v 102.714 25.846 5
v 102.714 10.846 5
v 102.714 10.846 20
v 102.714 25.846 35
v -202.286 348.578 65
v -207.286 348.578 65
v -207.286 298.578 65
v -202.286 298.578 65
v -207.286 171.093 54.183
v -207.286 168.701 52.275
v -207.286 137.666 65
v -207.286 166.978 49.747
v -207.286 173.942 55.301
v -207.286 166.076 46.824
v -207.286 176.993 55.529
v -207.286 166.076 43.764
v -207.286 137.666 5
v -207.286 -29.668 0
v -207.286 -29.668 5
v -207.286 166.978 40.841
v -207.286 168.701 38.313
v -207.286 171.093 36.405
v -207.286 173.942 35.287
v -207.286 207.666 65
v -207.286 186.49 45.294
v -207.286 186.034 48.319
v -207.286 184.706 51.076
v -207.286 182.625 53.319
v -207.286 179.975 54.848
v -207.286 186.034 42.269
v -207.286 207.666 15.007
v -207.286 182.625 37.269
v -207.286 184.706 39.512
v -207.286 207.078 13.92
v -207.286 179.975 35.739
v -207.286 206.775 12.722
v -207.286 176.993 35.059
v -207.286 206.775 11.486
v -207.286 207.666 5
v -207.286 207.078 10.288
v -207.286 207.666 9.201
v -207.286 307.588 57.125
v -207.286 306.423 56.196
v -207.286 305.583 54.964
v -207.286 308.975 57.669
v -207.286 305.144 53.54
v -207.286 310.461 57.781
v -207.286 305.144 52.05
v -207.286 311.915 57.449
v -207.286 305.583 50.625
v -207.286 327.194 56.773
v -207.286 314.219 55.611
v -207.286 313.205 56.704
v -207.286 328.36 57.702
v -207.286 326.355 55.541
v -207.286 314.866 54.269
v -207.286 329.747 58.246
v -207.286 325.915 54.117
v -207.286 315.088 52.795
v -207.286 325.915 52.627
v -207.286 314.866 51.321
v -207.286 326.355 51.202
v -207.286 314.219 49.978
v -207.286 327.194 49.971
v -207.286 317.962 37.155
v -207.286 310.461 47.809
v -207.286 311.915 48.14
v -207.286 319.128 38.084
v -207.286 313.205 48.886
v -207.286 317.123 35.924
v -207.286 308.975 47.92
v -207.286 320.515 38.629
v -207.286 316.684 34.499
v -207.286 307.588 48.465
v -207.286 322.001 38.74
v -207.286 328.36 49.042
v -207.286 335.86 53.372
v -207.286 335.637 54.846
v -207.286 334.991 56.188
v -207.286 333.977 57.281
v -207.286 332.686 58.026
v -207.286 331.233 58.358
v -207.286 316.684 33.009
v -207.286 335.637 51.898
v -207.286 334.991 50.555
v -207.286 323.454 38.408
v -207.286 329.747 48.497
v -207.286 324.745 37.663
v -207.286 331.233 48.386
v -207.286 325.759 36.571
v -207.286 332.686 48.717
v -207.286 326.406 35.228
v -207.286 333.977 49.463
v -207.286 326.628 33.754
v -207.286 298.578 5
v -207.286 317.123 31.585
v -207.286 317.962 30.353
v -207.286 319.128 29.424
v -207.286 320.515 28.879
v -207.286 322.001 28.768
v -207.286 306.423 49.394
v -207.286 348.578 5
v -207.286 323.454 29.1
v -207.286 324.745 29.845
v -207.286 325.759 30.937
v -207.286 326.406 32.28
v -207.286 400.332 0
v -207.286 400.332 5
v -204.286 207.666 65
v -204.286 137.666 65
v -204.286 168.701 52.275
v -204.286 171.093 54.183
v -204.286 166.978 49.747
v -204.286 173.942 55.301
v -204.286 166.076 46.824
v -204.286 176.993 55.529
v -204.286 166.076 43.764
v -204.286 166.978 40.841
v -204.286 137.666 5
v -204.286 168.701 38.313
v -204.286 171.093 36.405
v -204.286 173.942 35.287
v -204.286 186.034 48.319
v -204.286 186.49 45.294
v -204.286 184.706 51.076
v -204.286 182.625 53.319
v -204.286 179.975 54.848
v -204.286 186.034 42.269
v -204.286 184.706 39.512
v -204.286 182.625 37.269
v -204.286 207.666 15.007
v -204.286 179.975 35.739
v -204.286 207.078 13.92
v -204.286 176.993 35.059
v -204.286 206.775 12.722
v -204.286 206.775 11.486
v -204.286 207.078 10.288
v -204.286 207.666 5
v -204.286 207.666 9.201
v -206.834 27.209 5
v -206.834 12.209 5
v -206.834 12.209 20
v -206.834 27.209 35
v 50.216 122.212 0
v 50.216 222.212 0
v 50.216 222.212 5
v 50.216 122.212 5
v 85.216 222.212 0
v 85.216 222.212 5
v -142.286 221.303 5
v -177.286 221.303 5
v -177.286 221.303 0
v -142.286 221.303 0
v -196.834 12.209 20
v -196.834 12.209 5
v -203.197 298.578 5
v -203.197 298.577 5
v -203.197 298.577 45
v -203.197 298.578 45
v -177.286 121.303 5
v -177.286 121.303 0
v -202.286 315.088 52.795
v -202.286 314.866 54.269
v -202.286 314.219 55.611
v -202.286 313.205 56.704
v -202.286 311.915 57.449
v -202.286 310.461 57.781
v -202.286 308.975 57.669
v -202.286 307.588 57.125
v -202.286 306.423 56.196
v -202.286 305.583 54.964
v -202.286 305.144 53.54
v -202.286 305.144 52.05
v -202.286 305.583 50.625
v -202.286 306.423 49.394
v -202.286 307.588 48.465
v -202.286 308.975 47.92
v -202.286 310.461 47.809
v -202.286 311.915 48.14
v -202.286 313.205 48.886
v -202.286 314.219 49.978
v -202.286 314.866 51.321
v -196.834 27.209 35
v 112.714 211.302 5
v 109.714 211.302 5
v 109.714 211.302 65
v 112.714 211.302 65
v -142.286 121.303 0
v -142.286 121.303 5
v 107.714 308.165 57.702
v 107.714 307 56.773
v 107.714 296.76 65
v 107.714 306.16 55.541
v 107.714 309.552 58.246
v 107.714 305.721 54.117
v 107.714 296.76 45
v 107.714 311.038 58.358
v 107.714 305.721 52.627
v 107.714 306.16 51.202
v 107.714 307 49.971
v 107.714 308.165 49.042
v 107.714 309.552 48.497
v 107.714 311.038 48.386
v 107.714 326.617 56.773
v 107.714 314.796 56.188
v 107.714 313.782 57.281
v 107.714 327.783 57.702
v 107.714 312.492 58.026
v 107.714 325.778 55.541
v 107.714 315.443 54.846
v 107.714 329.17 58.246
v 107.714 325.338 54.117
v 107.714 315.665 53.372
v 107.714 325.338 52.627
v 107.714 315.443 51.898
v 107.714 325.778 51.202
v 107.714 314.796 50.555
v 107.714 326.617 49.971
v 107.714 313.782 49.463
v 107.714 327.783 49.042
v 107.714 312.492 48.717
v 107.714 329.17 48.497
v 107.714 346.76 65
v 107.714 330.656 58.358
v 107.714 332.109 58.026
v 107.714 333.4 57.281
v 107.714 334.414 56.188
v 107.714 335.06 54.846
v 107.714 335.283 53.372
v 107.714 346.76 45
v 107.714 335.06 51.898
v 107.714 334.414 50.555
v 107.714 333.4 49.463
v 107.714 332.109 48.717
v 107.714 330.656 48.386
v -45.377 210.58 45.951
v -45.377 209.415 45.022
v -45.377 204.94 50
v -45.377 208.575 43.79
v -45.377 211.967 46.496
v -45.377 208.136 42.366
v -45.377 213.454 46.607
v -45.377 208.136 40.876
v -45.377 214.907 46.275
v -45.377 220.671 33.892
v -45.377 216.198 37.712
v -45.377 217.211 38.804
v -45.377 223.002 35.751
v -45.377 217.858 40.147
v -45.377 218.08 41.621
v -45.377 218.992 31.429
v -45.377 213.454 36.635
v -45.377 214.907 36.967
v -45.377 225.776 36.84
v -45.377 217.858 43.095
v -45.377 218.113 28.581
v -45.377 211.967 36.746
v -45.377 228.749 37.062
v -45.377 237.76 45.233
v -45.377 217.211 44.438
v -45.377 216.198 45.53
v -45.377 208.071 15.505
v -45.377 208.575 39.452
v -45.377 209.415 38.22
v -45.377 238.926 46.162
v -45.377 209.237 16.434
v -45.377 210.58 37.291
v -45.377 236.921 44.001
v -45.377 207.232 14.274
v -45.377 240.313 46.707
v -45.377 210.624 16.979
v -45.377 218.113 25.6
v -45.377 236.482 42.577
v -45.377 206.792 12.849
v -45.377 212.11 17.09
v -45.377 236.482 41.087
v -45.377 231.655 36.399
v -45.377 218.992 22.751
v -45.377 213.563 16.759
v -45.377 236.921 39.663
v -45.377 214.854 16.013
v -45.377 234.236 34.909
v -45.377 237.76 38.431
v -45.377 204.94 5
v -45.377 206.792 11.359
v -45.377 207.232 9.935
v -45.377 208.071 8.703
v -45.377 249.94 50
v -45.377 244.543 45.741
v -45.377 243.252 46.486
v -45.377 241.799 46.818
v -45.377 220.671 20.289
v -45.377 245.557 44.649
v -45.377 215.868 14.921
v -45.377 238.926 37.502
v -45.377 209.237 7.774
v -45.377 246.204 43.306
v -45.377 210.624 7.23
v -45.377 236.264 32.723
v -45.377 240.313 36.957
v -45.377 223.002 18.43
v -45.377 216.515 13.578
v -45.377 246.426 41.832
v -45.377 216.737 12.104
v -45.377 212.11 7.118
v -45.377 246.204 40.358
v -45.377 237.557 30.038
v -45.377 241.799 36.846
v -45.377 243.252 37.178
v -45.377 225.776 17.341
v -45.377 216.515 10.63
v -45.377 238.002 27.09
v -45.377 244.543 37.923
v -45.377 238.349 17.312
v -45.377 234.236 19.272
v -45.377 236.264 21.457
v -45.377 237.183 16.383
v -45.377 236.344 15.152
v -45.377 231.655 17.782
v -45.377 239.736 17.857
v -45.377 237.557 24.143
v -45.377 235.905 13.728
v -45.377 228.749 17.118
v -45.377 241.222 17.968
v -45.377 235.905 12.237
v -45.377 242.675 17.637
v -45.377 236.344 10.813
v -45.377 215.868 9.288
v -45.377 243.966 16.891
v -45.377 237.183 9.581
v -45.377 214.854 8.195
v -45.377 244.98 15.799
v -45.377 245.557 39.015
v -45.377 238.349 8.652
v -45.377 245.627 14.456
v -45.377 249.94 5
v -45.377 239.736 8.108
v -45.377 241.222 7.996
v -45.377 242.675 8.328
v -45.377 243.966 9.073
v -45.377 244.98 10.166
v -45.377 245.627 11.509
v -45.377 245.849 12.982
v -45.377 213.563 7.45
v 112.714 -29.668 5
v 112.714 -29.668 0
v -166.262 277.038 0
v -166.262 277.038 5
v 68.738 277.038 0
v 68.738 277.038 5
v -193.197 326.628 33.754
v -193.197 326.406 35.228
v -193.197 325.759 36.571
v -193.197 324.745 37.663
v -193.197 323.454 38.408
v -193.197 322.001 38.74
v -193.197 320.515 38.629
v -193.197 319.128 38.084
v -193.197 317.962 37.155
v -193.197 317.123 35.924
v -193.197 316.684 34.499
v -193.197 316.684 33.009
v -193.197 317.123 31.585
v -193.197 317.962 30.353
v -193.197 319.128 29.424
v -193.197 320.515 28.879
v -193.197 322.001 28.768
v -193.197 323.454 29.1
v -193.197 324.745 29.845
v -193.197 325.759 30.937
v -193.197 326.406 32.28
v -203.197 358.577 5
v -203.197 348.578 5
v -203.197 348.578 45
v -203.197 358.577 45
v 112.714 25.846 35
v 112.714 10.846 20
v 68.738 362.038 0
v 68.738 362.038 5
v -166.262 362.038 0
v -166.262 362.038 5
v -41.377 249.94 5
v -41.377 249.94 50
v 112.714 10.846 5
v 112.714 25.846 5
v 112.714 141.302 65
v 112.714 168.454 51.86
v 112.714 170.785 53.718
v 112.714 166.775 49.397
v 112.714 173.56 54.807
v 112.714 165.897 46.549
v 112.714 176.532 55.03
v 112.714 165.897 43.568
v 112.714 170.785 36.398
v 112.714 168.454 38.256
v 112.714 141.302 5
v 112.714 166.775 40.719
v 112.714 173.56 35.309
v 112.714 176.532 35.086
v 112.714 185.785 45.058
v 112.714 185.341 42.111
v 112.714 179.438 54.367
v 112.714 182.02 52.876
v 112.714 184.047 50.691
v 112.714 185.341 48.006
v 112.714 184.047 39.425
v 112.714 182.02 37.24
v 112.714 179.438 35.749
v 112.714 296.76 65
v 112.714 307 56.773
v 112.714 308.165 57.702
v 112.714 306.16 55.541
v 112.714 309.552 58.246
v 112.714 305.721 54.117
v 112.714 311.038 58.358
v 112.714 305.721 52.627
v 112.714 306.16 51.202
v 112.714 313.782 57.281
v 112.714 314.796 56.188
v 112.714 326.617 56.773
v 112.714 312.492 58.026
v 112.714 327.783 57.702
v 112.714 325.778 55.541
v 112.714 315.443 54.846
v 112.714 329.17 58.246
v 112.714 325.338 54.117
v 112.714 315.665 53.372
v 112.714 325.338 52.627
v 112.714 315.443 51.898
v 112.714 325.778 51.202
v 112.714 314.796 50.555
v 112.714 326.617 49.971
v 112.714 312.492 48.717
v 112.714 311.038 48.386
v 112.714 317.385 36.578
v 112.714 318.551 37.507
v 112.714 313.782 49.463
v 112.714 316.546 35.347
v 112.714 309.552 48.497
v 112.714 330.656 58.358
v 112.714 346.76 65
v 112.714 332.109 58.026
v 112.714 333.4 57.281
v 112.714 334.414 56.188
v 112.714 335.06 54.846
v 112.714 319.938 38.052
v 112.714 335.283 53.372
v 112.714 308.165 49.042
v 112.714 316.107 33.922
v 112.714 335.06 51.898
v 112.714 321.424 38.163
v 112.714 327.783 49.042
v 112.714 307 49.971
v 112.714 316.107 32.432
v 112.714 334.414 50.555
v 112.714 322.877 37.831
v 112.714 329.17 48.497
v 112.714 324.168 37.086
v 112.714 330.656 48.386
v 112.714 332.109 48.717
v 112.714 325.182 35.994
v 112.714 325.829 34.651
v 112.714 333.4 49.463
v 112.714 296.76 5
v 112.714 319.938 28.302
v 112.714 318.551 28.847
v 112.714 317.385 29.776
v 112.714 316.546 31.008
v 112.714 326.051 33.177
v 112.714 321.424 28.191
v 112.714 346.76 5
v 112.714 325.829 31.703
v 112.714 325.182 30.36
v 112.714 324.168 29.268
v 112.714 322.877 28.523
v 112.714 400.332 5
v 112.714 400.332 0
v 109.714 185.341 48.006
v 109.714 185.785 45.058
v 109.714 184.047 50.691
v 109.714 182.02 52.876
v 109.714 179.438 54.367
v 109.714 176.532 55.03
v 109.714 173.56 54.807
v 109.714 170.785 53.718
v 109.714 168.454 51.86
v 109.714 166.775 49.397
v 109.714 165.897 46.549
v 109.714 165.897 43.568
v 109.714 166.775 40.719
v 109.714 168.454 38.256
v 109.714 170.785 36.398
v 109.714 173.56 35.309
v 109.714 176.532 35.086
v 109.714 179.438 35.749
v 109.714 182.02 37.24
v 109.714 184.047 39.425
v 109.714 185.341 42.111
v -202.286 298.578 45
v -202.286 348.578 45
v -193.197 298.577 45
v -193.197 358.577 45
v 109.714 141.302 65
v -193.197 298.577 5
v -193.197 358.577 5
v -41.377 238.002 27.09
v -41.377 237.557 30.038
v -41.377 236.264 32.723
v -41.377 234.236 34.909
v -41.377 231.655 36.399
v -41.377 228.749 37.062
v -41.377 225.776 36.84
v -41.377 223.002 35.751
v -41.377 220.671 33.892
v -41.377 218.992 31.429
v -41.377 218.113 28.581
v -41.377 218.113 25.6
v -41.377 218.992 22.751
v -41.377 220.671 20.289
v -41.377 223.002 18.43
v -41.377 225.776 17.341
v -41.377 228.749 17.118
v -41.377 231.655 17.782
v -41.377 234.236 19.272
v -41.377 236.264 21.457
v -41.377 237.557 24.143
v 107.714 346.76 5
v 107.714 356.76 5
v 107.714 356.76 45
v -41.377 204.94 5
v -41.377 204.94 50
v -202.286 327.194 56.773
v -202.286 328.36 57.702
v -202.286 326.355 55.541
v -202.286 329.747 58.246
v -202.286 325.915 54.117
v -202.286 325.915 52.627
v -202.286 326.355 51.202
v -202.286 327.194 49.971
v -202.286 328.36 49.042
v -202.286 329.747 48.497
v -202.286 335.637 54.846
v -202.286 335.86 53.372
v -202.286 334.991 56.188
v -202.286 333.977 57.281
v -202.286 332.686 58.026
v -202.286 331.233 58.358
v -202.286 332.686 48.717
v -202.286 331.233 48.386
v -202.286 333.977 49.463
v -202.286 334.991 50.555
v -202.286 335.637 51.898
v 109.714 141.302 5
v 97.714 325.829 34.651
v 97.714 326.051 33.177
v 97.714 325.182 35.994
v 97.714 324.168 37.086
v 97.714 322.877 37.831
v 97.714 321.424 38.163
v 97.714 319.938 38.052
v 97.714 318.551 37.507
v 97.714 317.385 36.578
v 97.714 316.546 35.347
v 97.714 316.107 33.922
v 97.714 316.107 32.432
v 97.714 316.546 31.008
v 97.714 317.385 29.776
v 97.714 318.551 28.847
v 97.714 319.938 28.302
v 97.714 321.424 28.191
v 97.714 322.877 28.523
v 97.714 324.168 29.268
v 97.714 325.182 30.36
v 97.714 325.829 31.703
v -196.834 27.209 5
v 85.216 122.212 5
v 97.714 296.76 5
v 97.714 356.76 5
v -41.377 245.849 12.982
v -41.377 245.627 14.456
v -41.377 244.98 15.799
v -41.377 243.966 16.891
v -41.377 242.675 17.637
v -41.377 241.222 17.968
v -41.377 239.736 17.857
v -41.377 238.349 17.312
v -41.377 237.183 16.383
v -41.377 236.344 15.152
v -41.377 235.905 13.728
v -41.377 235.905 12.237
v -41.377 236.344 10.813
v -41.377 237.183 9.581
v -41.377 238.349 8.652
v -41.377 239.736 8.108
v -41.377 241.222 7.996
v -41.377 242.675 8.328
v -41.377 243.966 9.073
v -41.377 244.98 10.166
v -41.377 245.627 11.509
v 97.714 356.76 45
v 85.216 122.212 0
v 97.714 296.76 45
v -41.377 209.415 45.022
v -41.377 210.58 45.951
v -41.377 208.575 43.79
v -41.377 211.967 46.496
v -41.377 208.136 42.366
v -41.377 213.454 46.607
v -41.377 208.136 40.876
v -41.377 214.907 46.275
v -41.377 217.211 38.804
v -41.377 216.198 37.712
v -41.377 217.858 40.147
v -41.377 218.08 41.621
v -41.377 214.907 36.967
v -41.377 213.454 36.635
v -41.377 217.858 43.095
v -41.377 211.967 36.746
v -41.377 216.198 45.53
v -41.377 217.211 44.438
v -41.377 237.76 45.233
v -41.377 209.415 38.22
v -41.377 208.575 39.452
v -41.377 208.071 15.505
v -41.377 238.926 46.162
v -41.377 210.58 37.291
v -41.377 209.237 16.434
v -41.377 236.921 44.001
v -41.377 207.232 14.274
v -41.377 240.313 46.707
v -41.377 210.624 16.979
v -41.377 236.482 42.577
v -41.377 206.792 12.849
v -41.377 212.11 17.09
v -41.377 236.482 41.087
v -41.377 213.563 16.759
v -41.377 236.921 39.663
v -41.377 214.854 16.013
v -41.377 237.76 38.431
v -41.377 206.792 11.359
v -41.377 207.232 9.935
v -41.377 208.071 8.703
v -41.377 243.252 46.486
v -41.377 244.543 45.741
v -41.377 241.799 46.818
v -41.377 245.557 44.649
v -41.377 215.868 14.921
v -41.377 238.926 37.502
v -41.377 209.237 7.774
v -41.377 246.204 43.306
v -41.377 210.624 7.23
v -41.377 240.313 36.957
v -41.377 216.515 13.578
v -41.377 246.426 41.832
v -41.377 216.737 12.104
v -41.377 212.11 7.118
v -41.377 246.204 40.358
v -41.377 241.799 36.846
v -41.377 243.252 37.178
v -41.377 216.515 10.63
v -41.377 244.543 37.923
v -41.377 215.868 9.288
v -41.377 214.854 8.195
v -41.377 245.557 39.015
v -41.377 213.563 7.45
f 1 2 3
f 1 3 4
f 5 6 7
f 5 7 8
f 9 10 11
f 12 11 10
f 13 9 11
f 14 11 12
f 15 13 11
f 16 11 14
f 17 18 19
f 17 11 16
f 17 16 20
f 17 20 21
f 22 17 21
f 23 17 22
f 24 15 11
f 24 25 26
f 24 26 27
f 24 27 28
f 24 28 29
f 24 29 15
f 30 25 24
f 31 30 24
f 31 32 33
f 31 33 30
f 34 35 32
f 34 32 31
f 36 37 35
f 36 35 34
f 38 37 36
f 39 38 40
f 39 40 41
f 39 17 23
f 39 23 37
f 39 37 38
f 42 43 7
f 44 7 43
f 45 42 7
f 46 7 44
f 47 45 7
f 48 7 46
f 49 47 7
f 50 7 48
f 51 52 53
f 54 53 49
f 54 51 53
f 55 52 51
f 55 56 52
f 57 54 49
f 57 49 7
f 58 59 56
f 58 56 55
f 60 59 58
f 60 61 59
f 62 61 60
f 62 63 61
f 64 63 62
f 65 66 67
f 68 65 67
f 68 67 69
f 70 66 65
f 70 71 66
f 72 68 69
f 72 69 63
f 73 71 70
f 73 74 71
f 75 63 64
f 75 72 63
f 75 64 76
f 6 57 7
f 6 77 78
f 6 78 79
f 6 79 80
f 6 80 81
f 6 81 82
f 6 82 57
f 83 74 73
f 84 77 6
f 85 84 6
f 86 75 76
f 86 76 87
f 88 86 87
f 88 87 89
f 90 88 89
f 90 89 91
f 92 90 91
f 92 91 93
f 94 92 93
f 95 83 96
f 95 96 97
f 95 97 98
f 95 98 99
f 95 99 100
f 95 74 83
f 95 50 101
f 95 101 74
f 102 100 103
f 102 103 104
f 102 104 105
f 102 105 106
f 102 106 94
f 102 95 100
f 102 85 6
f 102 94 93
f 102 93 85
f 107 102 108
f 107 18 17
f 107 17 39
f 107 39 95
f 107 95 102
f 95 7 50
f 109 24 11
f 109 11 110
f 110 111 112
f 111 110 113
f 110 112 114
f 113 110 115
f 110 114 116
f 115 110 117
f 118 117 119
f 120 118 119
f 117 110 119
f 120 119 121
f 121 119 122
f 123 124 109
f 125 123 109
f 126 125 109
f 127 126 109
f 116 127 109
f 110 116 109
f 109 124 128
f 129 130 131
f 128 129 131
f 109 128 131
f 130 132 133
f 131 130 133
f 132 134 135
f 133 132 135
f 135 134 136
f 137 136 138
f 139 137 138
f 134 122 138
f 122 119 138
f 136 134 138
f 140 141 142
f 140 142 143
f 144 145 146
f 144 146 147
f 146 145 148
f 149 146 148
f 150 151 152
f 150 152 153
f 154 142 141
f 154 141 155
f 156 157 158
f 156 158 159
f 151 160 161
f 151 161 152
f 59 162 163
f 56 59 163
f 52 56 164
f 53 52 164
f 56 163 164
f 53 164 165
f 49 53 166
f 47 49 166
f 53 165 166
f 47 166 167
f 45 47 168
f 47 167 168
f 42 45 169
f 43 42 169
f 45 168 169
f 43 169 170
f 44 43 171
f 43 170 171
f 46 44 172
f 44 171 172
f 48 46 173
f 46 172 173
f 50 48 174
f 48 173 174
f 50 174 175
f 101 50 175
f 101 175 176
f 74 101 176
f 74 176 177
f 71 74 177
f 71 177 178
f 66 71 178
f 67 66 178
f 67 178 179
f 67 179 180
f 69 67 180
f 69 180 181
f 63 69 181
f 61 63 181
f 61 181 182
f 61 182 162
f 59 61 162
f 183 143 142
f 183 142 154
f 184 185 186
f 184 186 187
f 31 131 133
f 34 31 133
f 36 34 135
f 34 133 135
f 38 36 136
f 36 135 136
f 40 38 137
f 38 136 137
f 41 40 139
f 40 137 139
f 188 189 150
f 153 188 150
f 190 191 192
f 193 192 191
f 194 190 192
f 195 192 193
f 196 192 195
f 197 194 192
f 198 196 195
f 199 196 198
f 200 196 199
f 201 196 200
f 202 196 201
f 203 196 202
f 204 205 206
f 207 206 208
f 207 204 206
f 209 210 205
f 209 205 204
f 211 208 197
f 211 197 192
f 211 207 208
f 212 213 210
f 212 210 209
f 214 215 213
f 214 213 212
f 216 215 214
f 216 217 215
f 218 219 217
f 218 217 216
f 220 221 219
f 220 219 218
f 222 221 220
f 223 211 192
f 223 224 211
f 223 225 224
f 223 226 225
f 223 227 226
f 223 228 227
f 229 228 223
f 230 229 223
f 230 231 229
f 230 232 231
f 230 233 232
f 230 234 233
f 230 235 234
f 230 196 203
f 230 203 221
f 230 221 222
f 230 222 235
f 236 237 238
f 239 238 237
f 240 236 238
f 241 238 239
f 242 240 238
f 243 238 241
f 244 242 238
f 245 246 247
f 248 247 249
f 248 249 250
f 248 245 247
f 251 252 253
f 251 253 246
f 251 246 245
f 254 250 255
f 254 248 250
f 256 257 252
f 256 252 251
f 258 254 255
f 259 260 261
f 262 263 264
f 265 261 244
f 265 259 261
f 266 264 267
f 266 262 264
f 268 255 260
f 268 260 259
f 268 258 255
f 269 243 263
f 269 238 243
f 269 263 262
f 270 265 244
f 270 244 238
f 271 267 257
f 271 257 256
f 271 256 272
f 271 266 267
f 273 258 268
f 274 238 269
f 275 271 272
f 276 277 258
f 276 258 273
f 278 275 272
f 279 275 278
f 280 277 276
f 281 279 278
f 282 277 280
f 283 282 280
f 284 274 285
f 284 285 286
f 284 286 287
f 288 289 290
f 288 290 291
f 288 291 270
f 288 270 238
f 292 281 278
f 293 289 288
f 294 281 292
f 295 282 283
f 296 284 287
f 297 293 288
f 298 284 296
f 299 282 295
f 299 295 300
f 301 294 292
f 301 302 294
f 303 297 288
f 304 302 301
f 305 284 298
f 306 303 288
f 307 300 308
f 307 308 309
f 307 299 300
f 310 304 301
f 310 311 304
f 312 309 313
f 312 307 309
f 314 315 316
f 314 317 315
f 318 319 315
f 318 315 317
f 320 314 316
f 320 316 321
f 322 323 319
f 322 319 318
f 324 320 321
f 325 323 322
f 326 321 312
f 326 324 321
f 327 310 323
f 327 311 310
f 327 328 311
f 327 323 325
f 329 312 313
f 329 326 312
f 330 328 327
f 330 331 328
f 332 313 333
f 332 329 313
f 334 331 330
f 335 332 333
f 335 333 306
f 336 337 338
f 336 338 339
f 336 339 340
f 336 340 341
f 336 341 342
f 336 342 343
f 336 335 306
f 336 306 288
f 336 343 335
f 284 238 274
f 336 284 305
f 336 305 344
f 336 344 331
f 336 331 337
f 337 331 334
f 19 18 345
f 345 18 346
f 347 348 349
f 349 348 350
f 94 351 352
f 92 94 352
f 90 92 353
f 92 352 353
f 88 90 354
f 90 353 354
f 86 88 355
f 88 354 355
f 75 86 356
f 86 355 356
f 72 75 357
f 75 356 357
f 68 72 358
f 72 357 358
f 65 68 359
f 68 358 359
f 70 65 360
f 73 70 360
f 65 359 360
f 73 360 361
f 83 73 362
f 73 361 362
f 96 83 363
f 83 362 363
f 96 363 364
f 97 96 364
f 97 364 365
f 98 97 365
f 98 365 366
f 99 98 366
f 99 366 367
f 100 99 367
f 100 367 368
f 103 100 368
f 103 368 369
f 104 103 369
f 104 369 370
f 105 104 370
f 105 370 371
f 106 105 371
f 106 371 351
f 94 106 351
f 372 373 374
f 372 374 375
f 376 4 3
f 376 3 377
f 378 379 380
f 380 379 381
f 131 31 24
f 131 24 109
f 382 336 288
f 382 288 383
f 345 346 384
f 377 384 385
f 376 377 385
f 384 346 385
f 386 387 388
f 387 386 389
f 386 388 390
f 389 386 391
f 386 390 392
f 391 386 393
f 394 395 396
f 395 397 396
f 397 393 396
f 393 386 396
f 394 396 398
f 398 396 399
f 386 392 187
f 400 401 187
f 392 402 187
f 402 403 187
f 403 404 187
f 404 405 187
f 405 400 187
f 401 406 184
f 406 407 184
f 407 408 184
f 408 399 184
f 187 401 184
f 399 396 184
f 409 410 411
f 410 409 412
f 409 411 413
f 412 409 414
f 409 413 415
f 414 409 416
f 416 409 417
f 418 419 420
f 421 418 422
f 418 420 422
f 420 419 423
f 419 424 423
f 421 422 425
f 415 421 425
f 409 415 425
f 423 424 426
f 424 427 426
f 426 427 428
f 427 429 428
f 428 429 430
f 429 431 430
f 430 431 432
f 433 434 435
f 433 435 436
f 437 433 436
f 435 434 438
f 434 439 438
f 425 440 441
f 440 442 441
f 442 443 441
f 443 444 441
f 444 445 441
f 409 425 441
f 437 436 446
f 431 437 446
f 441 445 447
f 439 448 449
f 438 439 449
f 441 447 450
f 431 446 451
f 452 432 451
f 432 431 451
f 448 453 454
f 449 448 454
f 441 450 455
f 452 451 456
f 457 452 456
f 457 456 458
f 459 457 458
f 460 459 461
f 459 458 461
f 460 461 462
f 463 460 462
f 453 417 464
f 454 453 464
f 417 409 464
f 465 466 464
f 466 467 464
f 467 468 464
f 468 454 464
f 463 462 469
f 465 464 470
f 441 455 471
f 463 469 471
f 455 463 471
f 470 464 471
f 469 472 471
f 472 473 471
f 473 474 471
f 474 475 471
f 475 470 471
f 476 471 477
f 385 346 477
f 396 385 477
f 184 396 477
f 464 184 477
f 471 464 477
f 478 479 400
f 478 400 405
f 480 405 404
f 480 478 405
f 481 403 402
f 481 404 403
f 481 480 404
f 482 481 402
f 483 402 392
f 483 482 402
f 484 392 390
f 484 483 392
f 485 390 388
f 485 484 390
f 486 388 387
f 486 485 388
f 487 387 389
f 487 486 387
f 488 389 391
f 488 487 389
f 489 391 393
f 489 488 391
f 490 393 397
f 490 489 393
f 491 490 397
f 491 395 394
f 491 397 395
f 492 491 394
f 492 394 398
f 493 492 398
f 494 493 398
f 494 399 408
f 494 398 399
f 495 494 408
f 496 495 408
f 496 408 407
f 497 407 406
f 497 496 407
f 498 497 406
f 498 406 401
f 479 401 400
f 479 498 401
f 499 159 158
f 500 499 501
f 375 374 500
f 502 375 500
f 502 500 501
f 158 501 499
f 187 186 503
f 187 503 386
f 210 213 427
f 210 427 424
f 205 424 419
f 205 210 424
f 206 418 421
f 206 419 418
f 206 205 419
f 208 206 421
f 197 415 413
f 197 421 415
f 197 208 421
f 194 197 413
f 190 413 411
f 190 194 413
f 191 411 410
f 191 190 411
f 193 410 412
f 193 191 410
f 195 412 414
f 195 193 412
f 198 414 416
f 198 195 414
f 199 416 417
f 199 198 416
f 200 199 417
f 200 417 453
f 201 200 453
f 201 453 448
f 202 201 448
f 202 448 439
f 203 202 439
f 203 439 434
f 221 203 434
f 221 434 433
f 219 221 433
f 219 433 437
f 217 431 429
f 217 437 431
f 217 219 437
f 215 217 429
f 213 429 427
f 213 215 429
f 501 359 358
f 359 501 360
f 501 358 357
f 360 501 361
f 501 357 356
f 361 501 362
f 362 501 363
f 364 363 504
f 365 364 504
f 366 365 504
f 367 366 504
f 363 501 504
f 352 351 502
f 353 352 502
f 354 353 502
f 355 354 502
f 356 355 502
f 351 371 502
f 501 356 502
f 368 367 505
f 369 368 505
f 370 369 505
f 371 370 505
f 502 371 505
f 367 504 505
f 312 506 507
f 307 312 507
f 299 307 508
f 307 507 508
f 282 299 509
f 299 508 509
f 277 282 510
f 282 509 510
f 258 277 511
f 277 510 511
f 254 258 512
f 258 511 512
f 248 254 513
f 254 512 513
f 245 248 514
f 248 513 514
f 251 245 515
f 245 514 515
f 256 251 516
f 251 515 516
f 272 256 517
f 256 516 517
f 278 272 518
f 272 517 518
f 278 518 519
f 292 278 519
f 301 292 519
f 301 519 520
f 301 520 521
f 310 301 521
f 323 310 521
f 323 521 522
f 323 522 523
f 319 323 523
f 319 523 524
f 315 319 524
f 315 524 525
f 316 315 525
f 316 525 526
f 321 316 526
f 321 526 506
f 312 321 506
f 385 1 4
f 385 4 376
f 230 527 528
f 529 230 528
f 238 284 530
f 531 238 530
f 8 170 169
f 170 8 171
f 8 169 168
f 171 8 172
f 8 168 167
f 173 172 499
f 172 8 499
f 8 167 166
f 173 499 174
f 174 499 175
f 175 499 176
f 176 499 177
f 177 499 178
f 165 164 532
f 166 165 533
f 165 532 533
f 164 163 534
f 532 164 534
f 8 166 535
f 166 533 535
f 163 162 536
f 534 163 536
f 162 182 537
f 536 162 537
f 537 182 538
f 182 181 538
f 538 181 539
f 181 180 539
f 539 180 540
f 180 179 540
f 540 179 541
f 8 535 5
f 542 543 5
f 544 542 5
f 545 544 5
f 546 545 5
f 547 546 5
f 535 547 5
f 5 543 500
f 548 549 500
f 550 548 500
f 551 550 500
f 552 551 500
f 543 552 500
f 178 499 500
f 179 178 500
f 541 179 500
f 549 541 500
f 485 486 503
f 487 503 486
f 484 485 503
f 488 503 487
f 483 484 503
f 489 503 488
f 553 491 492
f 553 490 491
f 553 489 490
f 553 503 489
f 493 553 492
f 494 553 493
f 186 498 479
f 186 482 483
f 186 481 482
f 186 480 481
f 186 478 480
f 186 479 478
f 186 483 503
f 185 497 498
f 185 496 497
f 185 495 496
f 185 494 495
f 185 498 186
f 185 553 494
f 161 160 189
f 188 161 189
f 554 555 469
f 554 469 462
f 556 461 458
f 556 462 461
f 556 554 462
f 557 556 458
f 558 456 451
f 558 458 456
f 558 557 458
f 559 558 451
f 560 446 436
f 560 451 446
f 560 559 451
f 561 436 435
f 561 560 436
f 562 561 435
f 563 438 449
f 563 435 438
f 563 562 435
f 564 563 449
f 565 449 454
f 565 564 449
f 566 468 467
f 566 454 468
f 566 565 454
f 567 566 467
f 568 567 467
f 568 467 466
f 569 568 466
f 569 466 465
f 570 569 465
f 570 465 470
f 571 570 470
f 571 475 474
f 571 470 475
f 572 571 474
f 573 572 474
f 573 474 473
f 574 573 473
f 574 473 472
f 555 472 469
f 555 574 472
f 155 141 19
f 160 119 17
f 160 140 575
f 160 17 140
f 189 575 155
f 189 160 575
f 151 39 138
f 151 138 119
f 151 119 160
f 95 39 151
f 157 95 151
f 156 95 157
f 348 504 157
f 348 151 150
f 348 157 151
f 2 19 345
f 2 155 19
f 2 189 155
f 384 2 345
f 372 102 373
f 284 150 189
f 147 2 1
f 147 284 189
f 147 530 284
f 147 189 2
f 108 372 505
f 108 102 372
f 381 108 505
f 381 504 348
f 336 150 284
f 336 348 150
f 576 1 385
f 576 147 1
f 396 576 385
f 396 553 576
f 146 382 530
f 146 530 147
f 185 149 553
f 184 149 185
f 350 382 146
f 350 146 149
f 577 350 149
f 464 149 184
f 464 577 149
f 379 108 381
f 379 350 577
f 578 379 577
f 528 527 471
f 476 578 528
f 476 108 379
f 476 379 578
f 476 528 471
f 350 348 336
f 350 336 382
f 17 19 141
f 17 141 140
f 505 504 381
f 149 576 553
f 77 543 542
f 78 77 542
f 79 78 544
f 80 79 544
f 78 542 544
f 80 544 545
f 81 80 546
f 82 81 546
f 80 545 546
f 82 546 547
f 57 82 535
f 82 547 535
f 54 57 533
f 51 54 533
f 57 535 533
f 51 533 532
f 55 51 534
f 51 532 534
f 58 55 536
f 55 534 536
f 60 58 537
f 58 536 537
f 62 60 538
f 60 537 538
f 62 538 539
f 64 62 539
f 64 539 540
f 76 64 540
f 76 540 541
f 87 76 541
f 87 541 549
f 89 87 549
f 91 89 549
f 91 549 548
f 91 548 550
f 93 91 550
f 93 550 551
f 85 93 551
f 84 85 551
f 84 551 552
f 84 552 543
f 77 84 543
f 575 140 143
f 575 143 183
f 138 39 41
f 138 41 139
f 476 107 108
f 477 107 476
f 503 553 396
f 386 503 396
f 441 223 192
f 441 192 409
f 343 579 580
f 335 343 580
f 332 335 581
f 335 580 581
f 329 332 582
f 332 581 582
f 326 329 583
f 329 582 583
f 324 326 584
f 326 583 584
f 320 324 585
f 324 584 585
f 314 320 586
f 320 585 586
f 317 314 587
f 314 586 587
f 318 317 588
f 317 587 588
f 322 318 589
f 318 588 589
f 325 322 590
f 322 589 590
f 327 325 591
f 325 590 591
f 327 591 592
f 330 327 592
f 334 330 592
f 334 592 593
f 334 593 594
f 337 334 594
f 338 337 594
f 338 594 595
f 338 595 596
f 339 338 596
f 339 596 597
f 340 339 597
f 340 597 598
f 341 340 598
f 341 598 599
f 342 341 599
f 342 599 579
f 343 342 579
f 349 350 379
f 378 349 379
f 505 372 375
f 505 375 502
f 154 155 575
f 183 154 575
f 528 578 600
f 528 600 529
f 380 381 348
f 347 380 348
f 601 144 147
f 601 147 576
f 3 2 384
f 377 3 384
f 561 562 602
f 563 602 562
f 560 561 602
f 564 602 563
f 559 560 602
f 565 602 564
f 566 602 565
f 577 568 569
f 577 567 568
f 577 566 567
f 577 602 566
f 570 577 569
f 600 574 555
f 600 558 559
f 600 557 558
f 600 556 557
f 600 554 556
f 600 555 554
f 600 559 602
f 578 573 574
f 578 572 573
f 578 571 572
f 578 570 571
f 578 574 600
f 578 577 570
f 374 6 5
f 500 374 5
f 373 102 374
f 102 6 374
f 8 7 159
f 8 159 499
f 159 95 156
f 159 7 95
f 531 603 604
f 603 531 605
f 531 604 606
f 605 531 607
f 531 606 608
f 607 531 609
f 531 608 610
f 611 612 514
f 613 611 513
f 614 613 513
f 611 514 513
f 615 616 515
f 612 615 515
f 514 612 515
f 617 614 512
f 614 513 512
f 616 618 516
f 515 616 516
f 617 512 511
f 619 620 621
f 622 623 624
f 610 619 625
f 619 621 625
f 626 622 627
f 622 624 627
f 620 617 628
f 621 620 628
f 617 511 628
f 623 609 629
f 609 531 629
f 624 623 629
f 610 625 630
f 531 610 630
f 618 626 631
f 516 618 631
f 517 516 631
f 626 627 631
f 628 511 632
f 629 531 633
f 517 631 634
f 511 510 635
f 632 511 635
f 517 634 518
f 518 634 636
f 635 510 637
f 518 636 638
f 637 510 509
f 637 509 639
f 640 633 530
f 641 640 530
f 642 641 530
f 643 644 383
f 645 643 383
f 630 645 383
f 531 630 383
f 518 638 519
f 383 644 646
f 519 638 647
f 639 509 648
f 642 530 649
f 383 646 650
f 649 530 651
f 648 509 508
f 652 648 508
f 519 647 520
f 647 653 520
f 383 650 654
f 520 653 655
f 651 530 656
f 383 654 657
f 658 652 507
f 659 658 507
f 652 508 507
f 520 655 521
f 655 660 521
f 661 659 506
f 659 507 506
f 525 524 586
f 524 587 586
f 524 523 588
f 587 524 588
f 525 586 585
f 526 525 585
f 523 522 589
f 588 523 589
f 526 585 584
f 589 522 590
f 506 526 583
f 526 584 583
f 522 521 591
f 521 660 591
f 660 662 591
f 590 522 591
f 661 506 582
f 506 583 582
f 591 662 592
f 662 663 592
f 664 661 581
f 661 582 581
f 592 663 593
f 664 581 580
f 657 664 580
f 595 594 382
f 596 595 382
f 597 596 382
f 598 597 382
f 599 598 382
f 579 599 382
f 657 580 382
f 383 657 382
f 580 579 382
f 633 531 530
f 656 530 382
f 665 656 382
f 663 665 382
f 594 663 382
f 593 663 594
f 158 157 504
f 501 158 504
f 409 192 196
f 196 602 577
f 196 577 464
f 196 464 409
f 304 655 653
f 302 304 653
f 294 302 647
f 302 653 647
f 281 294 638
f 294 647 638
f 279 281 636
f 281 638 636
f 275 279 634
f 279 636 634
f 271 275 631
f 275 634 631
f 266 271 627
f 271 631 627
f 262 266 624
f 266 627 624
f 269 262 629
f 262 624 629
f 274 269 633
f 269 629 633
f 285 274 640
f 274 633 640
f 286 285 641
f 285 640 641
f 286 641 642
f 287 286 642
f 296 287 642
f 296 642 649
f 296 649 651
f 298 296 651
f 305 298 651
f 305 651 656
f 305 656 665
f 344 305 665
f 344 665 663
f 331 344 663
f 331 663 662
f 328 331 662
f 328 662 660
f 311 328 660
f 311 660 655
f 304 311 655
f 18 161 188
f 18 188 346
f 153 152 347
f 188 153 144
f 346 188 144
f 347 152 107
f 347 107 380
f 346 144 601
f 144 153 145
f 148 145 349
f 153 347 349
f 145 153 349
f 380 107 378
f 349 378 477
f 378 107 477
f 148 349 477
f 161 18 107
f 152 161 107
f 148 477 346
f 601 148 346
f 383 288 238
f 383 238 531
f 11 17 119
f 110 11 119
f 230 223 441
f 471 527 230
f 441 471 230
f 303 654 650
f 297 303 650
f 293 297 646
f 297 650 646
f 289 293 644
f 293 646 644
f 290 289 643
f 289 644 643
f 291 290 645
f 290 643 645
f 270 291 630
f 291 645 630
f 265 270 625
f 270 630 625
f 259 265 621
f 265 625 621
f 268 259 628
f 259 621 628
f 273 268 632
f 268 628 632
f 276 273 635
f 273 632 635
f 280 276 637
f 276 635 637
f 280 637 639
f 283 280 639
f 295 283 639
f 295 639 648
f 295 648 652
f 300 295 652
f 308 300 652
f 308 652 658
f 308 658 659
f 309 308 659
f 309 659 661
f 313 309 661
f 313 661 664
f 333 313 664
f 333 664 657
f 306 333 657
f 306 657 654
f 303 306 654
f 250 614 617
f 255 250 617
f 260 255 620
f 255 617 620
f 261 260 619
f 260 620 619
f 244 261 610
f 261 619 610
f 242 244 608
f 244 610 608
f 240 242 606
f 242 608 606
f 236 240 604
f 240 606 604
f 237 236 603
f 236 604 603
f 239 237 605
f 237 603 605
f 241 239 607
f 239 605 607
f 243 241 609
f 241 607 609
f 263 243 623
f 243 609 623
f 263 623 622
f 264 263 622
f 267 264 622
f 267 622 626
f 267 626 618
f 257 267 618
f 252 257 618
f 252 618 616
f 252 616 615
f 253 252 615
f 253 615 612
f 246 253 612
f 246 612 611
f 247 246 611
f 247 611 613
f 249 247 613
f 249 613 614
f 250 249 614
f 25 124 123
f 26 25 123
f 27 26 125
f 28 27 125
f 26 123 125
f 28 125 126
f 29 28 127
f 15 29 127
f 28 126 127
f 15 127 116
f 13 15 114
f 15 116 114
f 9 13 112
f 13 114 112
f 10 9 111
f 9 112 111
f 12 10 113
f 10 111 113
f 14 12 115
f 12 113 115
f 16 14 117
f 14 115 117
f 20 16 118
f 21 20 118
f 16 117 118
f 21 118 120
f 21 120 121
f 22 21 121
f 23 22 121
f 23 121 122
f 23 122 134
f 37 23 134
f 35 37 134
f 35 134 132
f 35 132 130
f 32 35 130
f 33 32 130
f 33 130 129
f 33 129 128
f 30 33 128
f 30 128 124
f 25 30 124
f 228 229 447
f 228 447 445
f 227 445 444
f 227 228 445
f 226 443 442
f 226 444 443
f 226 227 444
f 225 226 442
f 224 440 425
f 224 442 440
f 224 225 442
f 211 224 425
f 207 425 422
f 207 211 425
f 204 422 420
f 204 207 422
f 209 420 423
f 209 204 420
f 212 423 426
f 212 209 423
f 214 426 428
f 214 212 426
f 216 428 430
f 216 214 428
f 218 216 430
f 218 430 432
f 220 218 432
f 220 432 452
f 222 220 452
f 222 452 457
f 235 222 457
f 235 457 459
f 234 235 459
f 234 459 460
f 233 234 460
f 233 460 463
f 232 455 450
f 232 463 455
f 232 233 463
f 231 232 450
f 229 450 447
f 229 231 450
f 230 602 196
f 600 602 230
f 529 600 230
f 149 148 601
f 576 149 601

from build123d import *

# Parameters (mm, degrees)
F0_W      = 320
F0_H      = 430
F1_DEPTH  = 5
F2_W      = 35
F2_H      = 100
F3_DEPTH  = 5
F4_W      = 35
F4_H      = 100
F5_DEPTH  = 5
F7_DEPTH  = 5
F8_W      = 3
F8_H      = 70
F9_DEPTH  = 60
F10_W     = 3
F10_H     = 70
F11_DEPTH = 60
F12_W     = 5
F12_H     = 50
F13_DEPTH = 60
F14_W     = 5
F14_H     = 50
F15_DEPTH = 60
F16_R     = 10
F17_DEPTH = 120
F18_R     = 10.2640382995
F19_DEPTH = 240
F20_W     = 10
F20_H     = 15
F21_DEPTH = 30
F22_SIZE  = 14.99999
F23_W     = 10
F23_H     = 15
F24_DEPTH = 30
F25_SIZE  = 14.99999
F26_W     = 4
F26_H     = 45
F27_DEPTH = 45
F28_W     = 10
F28_H     = 60
F29_DEPTH = 40
F30_W     = 10
F30_H     = 60
F31_DEPTH = 40
F32_R     = 5
F33_DEPTH = 240
F34_R     = 5
F35_DEPTH = 240
F36_R     = 5
F37_DEPTH = 250
F38_R     = 5
F39_DEPTH = 300
F40_R     = 5
F41_DEPTH = 300
F42_R     = 5
F43_DEPTH = 300
F44_R     = 10
F45_DEPTH = 207.2868810425
F46_R     = 5
F47_DEPTH = 207.2868810425
F48_R     = 5
F49_DEPTH = 207.2868810425
F50_R     = 5
F51_DEPTH = 207.2868810425
F52_R     = 5
F53_DEPTH = 207.2868810425


# Not quite as in the source:
# - a fillet or chamfer is up to 0.001 mm smaller than in the source, because OpenCascade refuses the exact size


with BuildPart() as f1:
    # F0 (on Top) → F1 (new body)
    with BuildSketch(Plane.XY):
        with Locations((-47.2858810425, 185.3322760761)):
            Rectangle(F0_W, F0_H)
    extrude(amount=F1_DEPTH)

    # F2 (on face) → F3 (cut)
    with BuildSketch(Plane.XY.offset(5)):
        with Locations((-159.7858810425, 171.3026314974)):
            Rectangle(F2_W, F2_H)
    extrude(amount=-F3_DEPTH, mode=Mode.SUBTRACT)

    # F4 (on face) → F5 (cut)
    with BuildSketch(Plane(origin=(0, 0, 0), x_dir=(1, 0, 0), z_dir=(0, 0, -1))):
        with Locations((67.7159577608, -172.2117364407)):
            Rectangle(F4_W, F4_H)
    extrude(amount=-F5_DEPTH, mode=Mode.SUBTRACT)

    # F6 (on face) → F7 (cut)
    with BuildSketch(Plane.XY.offset(5)):
        Polygon((68.7382593751, 362.0384633541), (-166.2617406249, 362.0384633541), (-166.2617406249, 277.0384633541), (-65.0134384632, 277.0384633541), (-48.7617406249, 277.0384633541), (68.7382593751, 277.0384633541), align=None)
    extrude(amount=-F7_DEPTH, mode=Mode.SUBTRACT)

    # F8 (on face) → F9 (join)
    with BuildSketch(Plane.XY.offset(5)):
        with Locations((-205.7858810425, 172.665733695)):
            Rectangle(F8_W, F8_H)
    extrude(amount=F9_DEPTH)

    # F10 (on face) → F11 (join)
    with BuildSketch(Plane.XY.offset(5)):
        with Locations((111.2141189575, 176.3021534681)):
            Rectangle(F10_W, F10_H)
    extrude(amount=F11_DEPTH)

    # F12 (on face) → F13 (join)
    with BuildSketch(Plane.XY.offset(5)):
        with Locations((-204.7858810425, 323.5781848431)):
            Rectangle(F12_W, F12_H)
    extrude(amount=F13_DEPTH)

    # F14 (on face) → F15 (join)
    with BuildSketch(Plane.XY.offset(5)):
        with Locations((110.2141189575, 321.7600047588)):
            Rectangle(F14_W, F14_H)
    extrude(amount=F15_DEPTH)

    # F16 (on Right) → F17 (cut)
    with BuildSketch(Plane.YZ):
        with Locations((175.784942263, 45.0581042336)):
            Circle(F16_R)
    extrude(amount=F17_DEPTH, mode=Mode.SUBTRACT)

    # F18 (on Right) → F19 (cut)
    with BuildSketch(Plane.YZ):
        with Locations((176.2254685163, 45.2939495444)):
            Circle(F18_R)
    extrude(amount=-F19_DEPTH, mode=Mode.SUBTRACT)

    # F20 (on face) → F21 (join)
    with BuildSketch(Plane.XY.offset(5)):
        with Locations((107.7141189575, 18.3457679302)):
            Rectangle(F20_W, F20_H)
    extrude(amount=F21_DEPTH)

    # F22 (size 15 in the source; OpenCascade refuses exactly that, so slightly less here)
    f22_edges = [f1.edges().sort_by_distance(p)[0] for p in [
        (107.714119, 10.845768, 35),
    ]]
    chamfer(f22_edges, length=F22_SIZE)

    # F23 (on face) → F24 (join)
    with BuildSketch(Plane.XY.offset(5)):
        with Locations((-201.83388412, 19.7091826051)):
            Rectangle(F23_W, F23_H)
    extrude(amount=F24_DEPTH)

    # F25 (size 15 in the source; OpenCascade refuses exactly that, so slightly less here)
    f25_edges = [f1.edges().sort_by_distance(p)[0] for p in [
        (-201.833884, 12.209183, 35),
    ]]
    chamfer(f25_edges, length=F25_SIZE)

    # F26 (on face) → F27 (join)
    with BuildSketch(Plane.XY.offset(5)):
        with Locations((-43.3766950369, 227.4395442009)):
            Rectangle(F26_W, F26_H)
    extrude(amount=F27_DEPTH)

    # F28 (on face) → F29 (join)
    with BuildSketch(Plane.XY.offset(5)):
        with Locations((102.7141189575, 326.7600047588)):
            Rectangle(F28_W, F28_H)
    extrude(amount=F29_DEPTH)

    # F30 (on face) → F31 (join)
    with BuildSketch(Plane.XY.offset(5)):
        with Locations((-198.1973099709, 328.5773980618)):
            Rectangle(F30_W, F30_H)
    extrude(amount=F31_DEPTH)

    # F32 (on Right) → F33 (cut)
    with BuildSketch(Plane.YZ):
        with Locations((310.6648027897, 53.3718466759)):
            Circle(F32_R)
    extrude(amount=F33_DEPTH, mode=Mode.SUBTRACT)

    # F34 (on Right) → F35 (cut)
    with BuildSketch(Plane.YZ):
        with Locations((330.2825987339, 53.3718466759)):
            Circle(F34_R)
    extrude(amount=F35_DEPTH, mode=Mode.SUBTRACT)

    # F36 (on Right) → F37 (cut)
    with BuildSketch(Plane.YZ):
        with Locations((321.0507035255, 33.1770926714)):
            Circle(F36_R)
    extrude(amount=F37_DEPTH, mode=Mode.SUBTRACT)

    # F38 (on Right) → F39 (cut)
    with BuildSketch(Plane.YZ):
        with Locations((310.0878298283, 52.794855088)):
            Circle(F38_R)
    extrude(amount=-F39_DEPTH, mode=Mode.SUBTRACT)

    # F40 (on Right) → F41 (cut)
    with BuildSketch(Plane.YZ):
        with Locations((330.8595716953, 53.3718466759)):
            Circle(F40_R)
    extrude(amount=-F41_DEPTH, mode=Mode.SUBTRACT)

    # F42 (on Right) → F43 (cut)
    with BuildSketch(Plane.YZ):
        with Locations((321.627676487, 33.7540879846)):
            Circle(F42_R)
    extrude(amount=-F43_DEPTH, mode=Mode.SUBTRACT)

    # F44 (on Right) → F45 (cut, through all)
    with BuildSketch(Plane.YZ):
        with Locations((228.0015647411, 27.0902961493)):
            Circle(F44_R)
    extrude(amount=-F45_DEPTH, mode=Mode.SUBTRACT)

    # F46 (on Right) → F47 (cut, through all)
    with BuildSketch(Plane.YZ):
        with Locations((241.425678134, 41.8319888413)):
            Circle(F46_R)
    extrude(amount=-F47_DEPTH, mode=Mode.SUBTRACT)

    # F48 (on Right) → F49 (cut, through all)
    with BuildSketch(Plane.YZ):
        with Locations((240.8486753702, 12.9823405296)):
            Circle(F48_R)
    extrude(amount=-F49_DEPTH, mode=Mode.SUBTRACT)

    # F50 (on Right) → F51 (cut, through all)
    with BuildSketch(Plane.YZ):
        with Locations((213.0800783634, 41.6209772229)):
            Circle(F50_R)
    extrude(amount=-F51_DEPTH, mode=Mode.SUBTRACT)

    # F52 (on Right) → F53 (cut, through all)
    with BuildSketch(Plane.YZ):
        with Locations((211.7366492748, 12.104251422)):
            Circle(F52_R)
    extrude(amount=-F53_DEPTH, mode=Mode.SUBTRACT)


solid = f1.part
